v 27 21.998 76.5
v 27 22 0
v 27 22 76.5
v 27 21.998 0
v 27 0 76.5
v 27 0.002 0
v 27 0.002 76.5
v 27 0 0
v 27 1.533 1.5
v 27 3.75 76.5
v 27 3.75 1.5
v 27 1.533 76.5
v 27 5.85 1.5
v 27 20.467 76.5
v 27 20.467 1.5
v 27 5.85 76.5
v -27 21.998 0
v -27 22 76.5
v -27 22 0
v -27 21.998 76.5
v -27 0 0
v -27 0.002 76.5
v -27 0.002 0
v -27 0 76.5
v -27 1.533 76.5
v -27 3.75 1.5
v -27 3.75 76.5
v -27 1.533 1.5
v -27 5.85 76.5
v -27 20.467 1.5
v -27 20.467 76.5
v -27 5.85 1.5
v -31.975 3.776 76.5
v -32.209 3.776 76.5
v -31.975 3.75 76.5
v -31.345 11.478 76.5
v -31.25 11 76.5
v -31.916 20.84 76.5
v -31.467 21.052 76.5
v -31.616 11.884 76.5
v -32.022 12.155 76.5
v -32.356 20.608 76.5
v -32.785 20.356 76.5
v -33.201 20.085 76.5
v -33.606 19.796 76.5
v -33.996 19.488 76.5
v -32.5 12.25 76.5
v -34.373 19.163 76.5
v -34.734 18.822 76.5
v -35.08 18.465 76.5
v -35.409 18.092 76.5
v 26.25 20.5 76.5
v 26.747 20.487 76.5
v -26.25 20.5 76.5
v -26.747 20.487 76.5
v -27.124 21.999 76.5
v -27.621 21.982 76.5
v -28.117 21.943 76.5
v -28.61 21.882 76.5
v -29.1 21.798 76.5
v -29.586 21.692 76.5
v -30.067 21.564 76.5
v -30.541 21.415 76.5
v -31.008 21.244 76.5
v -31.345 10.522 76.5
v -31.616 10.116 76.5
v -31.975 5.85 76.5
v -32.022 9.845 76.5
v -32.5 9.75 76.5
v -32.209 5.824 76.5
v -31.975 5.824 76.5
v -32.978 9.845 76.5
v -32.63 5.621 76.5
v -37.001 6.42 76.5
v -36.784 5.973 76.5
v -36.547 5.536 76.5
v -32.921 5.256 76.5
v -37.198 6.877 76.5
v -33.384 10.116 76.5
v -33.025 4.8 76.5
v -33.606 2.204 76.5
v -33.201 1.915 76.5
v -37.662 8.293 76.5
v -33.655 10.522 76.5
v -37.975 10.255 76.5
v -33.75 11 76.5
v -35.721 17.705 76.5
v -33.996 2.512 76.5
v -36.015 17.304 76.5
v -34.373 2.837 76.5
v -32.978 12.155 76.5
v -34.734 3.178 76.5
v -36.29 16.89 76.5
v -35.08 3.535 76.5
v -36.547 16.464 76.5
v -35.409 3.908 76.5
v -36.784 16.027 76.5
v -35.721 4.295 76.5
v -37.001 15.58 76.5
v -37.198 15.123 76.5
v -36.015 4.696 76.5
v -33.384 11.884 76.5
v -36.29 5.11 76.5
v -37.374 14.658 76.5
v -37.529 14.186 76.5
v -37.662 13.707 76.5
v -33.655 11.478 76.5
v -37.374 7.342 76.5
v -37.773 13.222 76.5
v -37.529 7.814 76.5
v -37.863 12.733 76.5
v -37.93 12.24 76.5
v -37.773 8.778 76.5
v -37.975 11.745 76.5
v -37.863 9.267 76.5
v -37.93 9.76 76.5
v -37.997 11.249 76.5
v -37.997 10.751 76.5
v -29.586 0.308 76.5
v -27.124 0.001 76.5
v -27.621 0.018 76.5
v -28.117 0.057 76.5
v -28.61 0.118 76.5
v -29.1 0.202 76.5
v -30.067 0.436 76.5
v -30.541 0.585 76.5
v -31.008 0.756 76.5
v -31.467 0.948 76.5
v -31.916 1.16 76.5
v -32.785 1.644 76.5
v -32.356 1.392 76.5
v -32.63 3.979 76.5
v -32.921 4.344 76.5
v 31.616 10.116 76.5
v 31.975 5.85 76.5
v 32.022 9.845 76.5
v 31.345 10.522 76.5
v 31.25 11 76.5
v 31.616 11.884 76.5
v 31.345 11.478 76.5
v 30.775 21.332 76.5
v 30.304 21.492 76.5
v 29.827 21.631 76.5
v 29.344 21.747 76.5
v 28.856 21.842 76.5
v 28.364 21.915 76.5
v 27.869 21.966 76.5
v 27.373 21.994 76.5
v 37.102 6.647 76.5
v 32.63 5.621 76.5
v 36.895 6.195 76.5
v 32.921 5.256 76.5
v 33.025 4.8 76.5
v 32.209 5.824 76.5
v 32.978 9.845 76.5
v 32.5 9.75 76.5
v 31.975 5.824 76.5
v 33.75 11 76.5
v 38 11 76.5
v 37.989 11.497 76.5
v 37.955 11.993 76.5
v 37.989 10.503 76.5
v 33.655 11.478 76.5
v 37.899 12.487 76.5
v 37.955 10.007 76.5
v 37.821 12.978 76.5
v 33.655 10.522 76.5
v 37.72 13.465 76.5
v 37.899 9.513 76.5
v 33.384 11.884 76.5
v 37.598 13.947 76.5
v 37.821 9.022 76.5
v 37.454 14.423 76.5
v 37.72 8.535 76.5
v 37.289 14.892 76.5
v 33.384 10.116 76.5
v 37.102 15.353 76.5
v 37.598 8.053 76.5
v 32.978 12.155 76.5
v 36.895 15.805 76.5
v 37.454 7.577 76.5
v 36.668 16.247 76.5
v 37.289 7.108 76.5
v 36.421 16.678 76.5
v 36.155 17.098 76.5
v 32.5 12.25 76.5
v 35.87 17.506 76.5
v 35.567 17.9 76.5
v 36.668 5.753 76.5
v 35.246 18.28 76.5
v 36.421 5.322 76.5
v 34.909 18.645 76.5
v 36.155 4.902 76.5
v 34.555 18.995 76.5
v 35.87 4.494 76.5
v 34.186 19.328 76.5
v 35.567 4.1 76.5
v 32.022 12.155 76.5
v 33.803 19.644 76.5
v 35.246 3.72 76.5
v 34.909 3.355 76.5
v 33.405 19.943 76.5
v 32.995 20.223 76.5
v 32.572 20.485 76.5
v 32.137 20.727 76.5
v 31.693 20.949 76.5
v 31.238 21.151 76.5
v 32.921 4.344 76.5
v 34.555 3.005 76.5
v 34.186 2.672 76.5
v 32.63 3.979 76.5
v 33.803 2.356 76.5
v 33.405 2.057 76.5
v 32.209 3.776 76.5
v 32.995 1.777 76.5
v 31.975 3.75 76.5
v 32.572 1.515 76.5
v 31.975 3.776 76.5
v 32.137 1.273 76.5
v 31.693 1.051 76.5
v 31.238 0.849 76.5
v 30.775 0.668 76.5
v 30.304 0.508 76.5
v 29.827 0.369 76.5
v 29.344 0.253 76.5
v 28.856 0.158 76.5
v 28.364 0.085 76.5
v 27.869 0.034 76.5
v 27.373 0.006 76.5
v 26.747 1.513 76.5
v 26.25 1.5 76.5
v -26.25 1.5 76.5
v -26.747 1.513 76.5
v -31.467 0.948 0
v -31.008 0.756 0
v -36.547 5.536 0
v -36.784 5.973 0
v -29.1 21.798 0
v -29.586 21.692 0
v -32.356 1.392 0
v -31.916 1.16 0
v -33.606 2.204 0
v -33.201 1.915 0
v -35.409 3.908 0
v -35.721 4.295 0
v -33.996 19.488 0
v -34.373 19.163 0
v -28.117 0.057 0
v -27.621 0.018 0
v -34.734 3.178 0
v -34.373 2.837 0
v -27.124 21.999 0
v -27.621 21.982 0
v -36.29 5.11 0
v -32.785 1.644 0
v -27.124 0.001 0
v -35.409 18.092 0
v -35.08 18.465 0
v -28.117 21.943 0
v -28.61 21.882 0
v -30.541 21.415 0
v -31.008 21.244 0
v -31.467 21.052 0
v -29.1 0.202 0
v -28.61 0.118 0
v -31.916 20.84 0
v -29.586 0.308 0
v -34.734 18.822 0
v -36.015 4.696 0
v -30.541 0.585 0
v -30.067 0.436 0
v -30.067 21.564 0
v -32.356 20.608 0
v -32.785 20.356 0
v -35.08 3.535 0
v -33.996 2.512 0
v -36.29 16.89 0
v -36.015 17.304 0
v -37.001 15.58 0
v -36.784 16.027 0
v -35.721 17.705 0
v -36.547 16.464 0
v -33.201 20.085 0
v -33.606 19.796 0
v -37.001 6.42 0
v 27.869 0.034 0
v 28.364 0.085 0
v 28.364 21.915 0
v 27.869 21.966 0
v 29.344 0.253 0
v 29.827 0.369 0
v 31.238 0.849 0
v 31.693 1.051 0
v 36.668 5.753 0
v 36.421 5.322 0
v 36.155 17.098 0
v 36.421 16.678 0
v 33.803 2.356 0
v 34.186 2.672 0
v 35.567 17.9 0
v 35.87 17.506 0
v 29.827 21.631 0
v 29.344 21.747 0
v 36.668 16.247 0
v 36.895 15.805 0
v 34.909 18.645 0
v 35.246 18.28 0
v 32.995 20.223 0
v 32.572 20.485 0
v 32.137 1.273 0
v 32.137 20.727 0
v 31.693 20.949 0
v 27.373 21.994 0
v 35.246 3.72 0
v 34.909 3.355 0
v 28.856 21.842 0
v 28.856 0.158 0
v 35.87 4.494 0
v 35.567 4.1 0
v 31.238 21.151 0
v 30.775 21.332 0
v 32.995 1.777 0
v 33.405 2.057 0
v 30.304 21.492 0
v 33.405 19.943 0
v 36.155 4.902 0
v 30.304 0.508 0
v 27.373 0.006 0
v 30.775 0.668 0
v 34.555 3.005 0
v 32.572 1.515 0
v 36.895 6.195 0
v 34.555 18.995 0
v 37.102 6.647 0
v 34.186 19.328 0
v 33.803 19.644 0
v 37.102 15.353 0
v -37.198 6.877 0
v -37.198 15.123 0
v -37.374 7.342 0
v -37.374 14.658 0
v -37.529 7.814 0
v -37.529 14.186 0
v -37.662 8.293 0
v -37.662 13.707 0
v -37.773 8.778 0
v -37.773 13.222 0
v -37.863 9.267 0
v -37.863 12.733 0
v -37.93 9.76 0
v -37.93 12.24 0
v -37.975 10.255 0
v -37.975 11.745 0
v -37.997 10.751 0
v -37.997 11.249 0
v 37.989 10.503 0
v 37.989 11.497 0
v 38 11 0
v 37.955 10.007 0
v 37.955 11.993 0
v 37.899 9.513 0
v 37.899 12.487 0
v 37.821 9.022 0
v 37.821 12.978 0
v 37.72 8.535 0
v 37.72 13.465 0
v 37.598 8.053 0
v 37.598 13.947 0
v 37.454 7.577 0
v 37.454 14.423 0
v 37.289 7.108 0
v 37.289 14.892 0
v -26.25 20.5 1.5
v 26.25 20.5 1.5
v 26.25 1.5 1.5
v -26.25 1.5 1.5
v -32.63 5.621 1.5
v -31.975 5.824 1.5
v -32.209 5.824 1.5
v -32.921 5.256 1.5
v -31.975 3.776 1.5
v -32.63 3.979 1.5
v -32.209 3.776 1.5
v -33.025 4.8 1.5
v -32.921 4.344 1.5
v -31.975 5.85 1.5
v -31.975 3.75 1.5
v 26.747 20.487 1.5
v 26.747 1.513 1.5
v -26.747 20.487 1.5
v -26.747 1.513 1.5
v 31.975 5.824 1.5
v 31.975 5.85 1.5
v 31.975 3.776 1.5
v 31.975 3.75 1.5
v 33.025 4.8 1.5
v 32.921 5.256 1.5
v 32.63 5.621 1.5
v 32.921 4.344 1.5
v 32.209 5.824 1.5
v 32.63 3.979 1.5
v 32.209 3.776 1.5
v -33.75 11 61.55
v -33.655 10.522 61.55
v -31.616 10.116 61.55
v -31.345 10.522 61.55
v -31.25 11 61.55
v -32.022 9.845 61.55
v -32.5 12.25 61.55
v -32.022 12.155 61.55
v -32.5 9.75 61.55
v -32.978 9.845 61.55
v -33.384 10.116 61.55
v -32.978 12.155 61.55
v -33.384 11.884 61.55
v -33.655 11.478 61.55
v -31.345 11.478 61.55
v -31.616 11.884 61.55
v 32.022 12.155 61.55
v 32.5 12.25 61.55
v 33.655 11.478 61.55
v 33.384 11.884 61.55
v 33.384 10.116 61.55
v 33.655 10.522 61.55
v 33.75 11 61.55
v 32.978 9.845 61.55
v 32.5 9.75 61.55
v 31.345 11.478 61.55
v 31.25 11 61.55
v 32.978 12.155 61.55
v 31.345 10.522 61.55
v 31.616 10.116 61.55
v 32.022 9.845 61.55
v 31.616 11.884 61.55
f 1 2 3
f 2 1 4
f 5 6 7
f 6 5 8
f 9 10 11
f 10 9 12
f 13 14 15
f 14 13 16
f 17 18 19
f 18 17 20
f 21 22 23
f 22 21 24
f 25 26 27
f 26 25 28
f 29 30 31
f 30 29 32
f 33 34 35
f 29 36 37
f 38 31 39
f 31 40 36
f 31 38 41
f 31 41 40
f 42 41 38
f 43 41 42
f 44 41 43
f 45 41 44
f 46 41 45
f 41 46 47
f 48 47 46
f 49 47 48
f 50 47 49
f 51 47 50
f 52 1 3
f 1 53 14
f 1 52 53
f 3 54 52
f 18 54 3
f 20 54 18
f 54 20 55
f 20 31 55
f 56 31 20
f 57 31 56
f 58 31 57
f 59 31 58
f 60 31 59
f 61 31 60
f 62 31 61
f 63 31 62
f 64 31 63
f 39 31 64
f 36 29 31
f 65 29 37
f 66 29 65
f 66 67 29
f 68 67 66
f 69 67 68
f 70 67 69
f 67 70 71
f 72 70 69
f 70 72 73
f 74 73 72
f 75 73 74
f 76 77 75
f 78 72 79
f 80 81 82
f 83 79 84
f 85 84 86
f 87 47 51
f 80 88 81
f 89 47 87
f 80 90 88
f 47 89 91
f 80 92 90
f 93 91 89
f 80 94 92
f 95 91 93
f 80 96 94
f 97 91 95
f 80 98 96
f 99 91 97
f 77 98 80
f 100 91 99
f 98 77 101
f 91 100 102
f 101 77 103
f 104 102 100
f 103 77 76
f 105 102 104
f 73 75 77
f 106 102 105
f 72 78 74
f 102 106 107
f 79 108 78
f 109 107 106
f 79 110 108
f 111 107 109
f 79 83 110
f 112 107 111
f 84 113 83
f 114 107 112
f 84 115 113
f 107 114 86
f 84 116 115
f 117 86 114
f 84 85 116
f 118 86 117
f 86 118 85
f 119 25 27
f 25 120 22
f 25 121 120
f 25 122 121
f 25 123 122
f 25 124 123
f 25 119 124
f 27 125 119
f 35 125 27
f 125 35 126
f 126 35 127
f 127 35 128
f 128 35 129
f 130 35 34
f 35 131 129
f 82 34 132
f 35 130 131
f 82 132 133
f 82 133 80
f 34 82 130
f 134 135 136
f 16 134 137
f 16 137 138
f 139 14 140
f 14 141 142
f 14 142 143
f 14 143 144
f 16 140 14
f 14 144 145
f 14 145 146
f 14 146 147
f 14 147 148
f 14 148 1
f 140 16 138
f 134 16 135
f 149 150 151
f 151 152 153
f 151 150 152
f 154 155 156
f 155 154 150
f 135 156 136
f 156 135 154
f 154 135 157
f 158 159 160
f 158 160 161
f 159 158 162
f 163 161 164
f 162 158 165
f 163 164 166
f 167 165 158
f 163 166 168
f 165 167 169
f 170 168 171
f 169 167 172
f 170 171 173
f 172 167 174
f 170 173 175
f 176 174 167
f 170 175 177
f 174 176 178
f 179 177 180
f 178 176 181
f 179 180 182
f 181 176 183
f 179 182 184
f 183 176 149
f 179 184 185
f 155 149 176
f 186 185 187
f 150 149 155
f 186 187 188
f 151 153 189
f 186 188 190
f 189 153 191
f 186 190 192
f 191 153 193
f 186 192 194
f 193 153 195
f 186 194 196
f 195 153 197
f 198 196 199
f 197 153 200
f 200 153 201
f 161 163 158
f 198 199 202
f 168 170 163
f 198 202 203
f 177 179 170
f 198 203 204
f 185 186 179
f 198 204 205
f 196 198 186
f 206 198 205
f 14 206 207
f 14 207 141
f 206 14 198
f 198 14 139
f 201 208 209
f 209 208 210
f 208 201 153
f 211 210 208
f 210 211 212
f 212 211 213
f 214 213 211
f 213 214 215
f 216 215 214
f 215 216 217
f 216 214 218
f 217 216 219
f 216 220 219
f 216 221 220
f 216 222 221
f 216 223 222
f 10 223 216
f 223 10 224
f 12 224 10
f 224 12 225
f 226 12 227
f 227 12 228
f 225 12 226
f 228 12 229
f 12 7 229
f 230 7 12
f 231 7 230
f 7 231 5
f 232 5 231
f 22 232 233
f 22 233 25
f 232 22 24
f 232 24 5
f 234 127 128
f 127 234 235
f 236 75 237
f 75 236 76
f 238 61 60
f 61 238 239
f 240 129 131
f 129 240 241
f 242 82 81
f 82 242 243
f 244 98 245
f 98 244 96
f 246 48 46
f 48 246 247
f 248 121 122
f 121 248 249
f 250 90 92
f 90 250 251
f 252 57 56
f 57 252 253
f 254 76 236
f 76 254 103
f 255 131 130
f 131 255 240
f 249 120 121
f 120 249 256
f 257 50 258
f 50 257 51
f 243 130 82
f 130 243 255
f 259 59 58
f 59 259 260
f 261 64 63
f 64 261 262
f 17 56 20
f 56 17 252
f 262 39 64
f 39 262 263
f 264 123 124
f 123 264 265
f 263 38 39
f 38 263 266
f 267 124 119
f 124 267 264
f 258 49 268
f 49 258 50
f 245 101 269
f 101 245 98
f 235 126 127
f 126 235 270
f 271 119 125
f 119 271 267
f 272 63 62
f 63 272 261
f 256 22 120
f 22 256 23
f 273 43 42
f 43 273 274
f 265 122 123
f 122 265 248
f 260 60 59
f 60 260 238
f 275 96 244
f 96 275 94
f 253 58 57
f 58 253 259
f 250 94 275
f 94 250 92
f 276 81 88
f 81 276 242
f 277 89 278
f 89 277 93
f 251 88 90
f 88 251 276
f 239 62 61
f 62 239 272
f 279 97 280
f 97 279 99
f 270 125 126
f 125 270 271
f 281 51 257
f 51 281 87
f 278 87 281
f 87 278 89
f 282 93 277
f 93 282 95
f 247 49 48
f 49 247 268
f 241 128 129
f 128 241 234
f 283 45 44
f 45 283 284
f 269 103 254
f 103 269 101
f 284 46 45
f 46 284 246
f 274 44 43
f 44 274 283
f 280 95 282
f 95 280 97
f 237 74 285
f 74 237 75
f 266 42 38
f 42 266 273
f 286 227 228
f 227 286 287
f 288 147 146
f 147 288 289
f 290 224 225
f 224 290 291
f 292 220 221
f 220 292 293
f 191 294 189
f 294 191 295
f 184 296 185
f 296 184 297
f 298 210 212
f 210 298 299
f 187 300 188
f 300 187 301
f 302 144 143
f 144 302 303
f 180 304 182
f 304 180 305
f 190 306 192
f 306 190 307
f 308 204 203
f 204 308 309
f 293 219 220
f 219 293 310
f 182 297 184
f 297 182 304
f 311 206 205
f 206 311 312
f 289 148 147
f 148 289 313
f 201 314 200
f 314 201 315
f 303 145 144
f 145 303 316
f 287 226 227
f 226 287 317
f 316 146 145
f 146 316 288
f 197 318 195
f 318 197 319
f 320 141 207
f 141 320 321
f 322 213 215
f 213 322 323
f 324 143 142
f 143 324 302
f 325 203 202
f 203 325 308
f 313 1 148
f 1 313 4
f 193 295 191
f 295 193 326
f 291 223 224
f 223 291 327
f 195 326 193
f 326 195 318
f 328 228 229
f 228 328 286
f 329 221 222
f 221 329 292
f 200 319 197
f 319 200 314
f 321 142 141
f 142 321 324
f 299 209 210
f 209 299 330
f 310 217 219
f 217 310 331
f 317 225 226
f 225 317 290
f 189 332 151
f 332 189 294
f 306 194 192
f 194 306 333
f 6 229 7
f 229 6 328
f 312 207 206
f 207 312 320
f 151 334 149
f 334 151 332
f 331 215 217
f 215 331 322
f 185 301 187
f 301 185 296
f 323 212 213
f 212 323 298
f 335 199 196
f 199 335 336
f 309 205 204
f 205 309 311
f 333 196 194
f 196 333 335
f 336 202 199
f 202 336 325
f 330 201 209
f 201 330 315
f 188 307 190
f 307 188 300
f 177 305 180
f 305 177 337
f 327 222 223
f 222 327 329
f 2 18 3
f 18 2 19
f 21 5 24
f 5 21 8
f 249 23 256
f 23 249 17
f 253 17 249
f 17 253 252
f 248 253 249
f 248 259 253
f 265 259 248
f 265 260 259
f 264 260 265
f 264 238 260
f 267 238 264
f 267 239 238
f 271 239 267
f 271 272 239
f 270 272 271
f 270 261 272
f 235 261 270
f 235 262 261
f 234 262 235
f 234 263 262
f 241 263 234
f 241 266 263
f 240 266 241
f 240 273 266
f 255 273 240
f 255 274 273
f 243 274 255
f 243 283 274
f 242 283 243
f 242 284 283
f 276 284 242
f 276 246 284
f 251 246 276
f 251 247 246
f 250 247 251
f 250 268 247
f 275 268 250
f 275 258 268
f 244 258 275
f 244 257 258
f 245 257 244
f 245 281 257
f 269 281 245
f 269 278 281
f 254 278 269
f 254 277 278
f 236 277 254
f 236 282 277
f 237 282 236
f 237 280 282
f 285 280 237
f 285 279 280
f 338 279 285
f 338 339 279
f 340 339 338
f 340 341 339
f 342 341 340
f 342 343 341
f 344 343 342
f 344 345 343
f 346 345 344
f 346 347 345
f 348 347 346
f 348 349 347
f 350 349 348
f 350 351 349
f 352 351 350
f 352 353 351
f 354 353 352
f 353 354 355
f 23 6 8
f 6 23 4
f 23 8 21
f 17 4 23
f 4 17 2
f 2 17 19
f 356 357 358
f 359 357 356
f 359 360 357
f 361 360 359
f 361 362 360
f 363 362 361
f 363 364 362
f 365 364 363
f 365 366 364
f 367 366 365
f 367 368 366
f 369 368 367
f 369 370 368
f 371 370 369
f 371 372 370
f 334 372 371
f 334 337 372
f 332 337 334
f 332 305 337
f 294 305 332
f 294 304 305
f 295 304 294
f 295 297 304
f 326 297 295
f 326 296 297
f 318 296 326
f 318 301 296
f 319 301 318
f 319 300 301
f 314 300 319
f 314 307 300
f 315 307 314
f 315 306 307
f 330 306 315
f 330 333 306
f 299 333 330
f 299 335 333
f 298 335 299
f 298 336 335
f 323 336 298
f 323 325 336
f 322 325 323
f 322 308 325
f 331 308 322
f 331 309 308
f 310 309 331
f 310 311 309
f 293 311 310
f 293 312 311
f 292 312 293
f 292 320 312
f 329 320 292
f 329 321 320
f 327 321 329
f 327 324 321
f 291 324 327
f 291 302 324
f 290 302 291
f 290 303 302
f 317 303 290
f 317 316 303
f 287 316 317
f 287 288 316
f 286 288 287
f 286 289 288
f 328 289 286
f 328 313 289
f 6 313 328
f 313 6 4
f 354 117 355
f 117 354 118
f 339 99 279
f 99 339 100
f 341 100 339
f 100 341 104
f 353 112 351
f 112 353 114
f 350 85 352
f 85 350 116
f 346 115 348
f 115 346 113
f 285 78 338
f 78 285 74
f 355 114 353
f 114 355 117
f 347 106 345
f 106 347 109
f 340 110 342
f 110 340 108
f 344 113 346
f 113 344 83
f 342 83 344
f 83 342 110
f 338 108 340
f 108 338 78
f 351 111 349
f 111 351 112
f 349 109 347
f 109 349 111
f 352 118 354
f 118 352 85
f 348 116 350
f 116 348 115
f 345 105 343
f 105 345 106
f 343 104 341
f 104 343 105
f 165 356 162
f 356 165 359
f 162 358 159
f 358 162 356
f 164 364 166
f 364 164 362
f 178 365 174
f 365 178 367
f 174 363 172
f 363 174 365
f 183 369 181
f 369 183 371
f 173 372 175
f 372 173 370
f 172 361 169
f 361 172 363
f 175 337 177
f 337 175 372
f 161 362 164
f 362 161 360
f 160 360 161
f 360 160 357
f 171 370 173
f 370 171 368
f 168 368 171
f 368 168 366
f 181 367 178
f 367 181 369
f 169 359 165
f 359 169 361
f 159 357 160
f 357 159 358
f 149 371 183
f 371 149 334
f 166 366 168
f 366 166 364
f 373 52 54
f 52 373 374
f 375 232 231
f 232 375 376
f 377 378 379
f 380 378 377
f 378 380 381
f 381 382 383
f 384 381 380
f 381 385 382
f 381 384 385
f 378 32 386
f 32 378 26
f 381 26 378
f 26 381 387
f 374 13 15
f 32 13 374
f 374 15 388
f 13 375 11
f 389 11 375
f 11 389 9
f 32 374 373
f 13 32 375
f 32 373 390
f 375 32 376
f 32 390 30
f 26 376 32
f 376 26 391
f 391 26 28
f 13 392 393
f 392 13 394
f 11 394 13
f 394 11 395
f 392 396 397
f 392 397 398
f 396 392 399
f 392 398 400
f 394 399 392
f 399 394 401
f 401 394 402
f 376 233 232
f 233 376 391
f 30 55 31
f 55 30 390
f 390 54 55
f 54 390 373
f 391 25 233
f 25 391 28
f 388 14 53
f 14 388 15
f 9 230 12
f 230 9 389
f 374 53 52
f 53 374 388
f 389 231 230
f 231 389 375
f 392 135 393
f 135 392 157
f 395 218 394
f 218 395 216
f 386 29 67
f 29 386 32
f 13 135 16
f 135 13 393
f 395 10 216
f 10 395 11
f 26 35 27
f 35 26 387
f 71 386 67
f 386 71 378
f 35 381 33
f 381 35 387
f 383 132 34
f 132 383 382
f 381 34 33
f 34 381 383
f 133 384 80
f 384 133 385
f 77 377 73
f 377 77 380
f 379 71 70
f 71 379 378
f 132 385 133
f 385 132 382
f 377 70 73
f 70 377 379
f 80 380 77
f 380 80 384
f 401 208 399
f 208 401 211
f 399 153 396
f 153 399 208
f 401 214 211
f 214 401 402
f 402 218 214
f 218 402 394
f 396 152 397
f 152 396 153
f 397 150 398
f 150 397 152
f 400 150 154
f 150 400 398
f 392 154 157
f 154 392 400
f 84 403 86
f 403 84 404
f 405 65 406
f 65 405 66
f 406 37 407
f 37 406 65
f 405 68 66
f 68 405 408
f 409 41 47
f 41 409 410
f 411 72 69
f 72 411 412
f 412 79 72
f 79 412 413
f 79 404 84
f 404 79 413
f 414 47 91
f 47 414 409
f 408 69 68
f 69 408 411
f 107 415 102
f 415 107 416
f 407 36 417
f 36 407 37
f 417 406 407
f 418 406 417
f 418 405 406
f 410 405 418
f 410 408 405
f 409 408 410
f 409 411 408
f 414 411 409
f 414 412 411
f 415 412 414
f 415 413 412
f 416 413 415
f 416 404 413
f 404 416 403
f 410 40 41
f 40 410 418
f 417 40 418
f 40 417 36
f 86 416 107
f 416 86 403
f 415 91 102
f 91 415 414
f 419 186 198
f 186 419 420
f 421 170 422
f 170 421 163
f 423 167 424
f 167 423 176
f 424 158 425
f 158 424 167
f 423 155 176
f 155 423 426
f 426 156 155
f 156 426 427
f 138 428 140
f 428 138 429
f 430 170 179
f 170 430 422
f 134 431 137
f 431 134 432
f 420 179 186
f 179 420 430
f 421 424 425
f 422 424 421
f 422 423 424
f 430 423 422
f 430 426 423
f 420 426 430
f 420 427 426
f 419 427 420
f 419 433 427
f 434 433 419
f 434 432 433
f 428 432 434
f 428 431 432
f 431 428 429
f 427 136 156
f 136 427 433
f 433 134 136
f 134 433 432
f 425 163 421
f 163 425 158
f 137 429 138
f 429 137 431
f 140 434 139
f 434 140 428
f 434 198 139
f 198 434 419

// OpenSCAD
eps = 0.05;
eps2 = 2 * eps;
$fa = 1;
$fs = 0.5;


// PCB dimensions
pcb_board = [64, 74.5, 1.6];
pcb_top = [51, 69, 14.5];
pcb_bottom = [51, 55, 2];
usb = [8, 6, 3];
usb_pos = [pcb_board.x - 19 - usb.x, -1.2, 1];    // Position from left-front of the PCB
switch = [8, 6, 3.5];
switch_pos = [16.2, -2, 0];

pcb_offset_z = 2;

// Case
inner = [62, pcb_board.y+0.5, 19];
outer = [65, inner.y+1.5, 22];

// Lid
lid_dim = [outer.x, 2.5, outer.z];


//##############################################################
// Design
//translate([0, 0.25, pcb_board.z+pcb_bottom.z+pcb_offset_z])
//    color("brown")  
//        pcb();

//translate([0, 0, 0])
//    color("green", 0.5) 
//        case();

//translate([0, -2.5, 0])
//    color("yellow", 0.5) 
//        lid();


//##############################################################
// For printing
rotate([-90, 0, 0])
    translate([0, -outer.y, 0])
        case();

//rotate([-90, 0, 0])
//    translate([0, -lid_dim.y, 0])
//        lid();


//##############################################################
module cube_x(dim) 
{
    translate([-dim.x/2, 0, 0])
        cube(dim);
}    

//##############################################################
module rounded_box(dim) 
{
    cube_x(dim - [dim.z/2, 0, 0]);
    
    translate([-(dim.x/2-dim.z/4), 0, dim.z/2])
        rotate([-90, 0, 0])
            cylinder(d=dim.z, h=dim.y);

    translate([(dim.x/2-dim.z/4), 0, dim.z/2])
        rotate([-90, 0, 0])
            cylinder(d=dim.z, h=dim.y);
}    

//##############################################################
module pcb() 
{
    cube_x(pcb_top);
    translate([0, 0, -pcb_board.z])
        cube_x(pcb_board);
    translate([0, 0, -pcb_bottom.z-pcb_board.z])
        cube_x(pcb_bottom);
    
    translate(usb_pos - [pcb_board.x/2, 0, 0])
        cube(usb);

    translate(switch_pos - [pcb_board.x/2, 0, 0])
        cube(switch);
}

//##############################################################
module case()
{
    // Outer case with constant wall thickness
    translate([0, 0, outer.z/2]) {
        difference() {
            translate([0, 0, -outer.z/2])
                rounded_box(outer);

            translate([0, -eps, -inner.z/2])
                rounded_box(inner + [0, eps, 0]);
        }
    }
        
    // PCB guides
    intersection() {
        difference() {
            union() {
                translate([-32, 0, 0]) 
                    cube_x([10, inner.y, outer.z]);

                translate([32, 0, 0]) 
                    cube_x([10, inner.y, outer.z]);
            }

            // Slot for the PCB
            translate([0, -eps, 3.75]) 
                rounded_box([pcb_board.x+1, inner.y+eps, pcb_board.z+0.5]);

            // Screw holes for M3x12
            translate([-outer.x/2, -eps, outer.z/2])
                rotate([-90, 0, 0])
                    cylinder(d=2.5, h=15);
            
            translate([outer.x/2, -eps, outer.z/2])
                rotate([-90, 0, 0])
                    cylinder(d=2.5, h=15);
        }
        rounded_box(outer);
    }
}

//##############################################################
module lid()
{
    difference() {
        rounded_box(lid_dim);

        translate([lid_dim.x/2, -eps, lid_dim.z/2])
            rotate([-90, 0, 0])
                cylinder(d1=6, d2=3, h=lid_dim.y+eps2);

        translate([-lid_dim.x/2, -eps, lid_dim.z/2])
            rotate([-90, 0, 0])
                cylinder(d1=6, d2=3, h=lid_dim.y+eps2);

        translate([-pcb_board.x/2, 0, pcb_board.z+pcb_bottom.z+pcb_offset_z]) {
            translate(usb_pos - [0.5, 0, 0.5])
                cube(usb + [1, 1, 1]);

            translate([usb_pos.x+4, -eps, usb_pos.z-4])
                rounded_box([usb.x+8, 1.5, usb.z+8]);
            
            translate(switch_pos - [0.5, 0, 0.5])
                cube(switch + [1, 1, 1]);
        }
    
     }
}
